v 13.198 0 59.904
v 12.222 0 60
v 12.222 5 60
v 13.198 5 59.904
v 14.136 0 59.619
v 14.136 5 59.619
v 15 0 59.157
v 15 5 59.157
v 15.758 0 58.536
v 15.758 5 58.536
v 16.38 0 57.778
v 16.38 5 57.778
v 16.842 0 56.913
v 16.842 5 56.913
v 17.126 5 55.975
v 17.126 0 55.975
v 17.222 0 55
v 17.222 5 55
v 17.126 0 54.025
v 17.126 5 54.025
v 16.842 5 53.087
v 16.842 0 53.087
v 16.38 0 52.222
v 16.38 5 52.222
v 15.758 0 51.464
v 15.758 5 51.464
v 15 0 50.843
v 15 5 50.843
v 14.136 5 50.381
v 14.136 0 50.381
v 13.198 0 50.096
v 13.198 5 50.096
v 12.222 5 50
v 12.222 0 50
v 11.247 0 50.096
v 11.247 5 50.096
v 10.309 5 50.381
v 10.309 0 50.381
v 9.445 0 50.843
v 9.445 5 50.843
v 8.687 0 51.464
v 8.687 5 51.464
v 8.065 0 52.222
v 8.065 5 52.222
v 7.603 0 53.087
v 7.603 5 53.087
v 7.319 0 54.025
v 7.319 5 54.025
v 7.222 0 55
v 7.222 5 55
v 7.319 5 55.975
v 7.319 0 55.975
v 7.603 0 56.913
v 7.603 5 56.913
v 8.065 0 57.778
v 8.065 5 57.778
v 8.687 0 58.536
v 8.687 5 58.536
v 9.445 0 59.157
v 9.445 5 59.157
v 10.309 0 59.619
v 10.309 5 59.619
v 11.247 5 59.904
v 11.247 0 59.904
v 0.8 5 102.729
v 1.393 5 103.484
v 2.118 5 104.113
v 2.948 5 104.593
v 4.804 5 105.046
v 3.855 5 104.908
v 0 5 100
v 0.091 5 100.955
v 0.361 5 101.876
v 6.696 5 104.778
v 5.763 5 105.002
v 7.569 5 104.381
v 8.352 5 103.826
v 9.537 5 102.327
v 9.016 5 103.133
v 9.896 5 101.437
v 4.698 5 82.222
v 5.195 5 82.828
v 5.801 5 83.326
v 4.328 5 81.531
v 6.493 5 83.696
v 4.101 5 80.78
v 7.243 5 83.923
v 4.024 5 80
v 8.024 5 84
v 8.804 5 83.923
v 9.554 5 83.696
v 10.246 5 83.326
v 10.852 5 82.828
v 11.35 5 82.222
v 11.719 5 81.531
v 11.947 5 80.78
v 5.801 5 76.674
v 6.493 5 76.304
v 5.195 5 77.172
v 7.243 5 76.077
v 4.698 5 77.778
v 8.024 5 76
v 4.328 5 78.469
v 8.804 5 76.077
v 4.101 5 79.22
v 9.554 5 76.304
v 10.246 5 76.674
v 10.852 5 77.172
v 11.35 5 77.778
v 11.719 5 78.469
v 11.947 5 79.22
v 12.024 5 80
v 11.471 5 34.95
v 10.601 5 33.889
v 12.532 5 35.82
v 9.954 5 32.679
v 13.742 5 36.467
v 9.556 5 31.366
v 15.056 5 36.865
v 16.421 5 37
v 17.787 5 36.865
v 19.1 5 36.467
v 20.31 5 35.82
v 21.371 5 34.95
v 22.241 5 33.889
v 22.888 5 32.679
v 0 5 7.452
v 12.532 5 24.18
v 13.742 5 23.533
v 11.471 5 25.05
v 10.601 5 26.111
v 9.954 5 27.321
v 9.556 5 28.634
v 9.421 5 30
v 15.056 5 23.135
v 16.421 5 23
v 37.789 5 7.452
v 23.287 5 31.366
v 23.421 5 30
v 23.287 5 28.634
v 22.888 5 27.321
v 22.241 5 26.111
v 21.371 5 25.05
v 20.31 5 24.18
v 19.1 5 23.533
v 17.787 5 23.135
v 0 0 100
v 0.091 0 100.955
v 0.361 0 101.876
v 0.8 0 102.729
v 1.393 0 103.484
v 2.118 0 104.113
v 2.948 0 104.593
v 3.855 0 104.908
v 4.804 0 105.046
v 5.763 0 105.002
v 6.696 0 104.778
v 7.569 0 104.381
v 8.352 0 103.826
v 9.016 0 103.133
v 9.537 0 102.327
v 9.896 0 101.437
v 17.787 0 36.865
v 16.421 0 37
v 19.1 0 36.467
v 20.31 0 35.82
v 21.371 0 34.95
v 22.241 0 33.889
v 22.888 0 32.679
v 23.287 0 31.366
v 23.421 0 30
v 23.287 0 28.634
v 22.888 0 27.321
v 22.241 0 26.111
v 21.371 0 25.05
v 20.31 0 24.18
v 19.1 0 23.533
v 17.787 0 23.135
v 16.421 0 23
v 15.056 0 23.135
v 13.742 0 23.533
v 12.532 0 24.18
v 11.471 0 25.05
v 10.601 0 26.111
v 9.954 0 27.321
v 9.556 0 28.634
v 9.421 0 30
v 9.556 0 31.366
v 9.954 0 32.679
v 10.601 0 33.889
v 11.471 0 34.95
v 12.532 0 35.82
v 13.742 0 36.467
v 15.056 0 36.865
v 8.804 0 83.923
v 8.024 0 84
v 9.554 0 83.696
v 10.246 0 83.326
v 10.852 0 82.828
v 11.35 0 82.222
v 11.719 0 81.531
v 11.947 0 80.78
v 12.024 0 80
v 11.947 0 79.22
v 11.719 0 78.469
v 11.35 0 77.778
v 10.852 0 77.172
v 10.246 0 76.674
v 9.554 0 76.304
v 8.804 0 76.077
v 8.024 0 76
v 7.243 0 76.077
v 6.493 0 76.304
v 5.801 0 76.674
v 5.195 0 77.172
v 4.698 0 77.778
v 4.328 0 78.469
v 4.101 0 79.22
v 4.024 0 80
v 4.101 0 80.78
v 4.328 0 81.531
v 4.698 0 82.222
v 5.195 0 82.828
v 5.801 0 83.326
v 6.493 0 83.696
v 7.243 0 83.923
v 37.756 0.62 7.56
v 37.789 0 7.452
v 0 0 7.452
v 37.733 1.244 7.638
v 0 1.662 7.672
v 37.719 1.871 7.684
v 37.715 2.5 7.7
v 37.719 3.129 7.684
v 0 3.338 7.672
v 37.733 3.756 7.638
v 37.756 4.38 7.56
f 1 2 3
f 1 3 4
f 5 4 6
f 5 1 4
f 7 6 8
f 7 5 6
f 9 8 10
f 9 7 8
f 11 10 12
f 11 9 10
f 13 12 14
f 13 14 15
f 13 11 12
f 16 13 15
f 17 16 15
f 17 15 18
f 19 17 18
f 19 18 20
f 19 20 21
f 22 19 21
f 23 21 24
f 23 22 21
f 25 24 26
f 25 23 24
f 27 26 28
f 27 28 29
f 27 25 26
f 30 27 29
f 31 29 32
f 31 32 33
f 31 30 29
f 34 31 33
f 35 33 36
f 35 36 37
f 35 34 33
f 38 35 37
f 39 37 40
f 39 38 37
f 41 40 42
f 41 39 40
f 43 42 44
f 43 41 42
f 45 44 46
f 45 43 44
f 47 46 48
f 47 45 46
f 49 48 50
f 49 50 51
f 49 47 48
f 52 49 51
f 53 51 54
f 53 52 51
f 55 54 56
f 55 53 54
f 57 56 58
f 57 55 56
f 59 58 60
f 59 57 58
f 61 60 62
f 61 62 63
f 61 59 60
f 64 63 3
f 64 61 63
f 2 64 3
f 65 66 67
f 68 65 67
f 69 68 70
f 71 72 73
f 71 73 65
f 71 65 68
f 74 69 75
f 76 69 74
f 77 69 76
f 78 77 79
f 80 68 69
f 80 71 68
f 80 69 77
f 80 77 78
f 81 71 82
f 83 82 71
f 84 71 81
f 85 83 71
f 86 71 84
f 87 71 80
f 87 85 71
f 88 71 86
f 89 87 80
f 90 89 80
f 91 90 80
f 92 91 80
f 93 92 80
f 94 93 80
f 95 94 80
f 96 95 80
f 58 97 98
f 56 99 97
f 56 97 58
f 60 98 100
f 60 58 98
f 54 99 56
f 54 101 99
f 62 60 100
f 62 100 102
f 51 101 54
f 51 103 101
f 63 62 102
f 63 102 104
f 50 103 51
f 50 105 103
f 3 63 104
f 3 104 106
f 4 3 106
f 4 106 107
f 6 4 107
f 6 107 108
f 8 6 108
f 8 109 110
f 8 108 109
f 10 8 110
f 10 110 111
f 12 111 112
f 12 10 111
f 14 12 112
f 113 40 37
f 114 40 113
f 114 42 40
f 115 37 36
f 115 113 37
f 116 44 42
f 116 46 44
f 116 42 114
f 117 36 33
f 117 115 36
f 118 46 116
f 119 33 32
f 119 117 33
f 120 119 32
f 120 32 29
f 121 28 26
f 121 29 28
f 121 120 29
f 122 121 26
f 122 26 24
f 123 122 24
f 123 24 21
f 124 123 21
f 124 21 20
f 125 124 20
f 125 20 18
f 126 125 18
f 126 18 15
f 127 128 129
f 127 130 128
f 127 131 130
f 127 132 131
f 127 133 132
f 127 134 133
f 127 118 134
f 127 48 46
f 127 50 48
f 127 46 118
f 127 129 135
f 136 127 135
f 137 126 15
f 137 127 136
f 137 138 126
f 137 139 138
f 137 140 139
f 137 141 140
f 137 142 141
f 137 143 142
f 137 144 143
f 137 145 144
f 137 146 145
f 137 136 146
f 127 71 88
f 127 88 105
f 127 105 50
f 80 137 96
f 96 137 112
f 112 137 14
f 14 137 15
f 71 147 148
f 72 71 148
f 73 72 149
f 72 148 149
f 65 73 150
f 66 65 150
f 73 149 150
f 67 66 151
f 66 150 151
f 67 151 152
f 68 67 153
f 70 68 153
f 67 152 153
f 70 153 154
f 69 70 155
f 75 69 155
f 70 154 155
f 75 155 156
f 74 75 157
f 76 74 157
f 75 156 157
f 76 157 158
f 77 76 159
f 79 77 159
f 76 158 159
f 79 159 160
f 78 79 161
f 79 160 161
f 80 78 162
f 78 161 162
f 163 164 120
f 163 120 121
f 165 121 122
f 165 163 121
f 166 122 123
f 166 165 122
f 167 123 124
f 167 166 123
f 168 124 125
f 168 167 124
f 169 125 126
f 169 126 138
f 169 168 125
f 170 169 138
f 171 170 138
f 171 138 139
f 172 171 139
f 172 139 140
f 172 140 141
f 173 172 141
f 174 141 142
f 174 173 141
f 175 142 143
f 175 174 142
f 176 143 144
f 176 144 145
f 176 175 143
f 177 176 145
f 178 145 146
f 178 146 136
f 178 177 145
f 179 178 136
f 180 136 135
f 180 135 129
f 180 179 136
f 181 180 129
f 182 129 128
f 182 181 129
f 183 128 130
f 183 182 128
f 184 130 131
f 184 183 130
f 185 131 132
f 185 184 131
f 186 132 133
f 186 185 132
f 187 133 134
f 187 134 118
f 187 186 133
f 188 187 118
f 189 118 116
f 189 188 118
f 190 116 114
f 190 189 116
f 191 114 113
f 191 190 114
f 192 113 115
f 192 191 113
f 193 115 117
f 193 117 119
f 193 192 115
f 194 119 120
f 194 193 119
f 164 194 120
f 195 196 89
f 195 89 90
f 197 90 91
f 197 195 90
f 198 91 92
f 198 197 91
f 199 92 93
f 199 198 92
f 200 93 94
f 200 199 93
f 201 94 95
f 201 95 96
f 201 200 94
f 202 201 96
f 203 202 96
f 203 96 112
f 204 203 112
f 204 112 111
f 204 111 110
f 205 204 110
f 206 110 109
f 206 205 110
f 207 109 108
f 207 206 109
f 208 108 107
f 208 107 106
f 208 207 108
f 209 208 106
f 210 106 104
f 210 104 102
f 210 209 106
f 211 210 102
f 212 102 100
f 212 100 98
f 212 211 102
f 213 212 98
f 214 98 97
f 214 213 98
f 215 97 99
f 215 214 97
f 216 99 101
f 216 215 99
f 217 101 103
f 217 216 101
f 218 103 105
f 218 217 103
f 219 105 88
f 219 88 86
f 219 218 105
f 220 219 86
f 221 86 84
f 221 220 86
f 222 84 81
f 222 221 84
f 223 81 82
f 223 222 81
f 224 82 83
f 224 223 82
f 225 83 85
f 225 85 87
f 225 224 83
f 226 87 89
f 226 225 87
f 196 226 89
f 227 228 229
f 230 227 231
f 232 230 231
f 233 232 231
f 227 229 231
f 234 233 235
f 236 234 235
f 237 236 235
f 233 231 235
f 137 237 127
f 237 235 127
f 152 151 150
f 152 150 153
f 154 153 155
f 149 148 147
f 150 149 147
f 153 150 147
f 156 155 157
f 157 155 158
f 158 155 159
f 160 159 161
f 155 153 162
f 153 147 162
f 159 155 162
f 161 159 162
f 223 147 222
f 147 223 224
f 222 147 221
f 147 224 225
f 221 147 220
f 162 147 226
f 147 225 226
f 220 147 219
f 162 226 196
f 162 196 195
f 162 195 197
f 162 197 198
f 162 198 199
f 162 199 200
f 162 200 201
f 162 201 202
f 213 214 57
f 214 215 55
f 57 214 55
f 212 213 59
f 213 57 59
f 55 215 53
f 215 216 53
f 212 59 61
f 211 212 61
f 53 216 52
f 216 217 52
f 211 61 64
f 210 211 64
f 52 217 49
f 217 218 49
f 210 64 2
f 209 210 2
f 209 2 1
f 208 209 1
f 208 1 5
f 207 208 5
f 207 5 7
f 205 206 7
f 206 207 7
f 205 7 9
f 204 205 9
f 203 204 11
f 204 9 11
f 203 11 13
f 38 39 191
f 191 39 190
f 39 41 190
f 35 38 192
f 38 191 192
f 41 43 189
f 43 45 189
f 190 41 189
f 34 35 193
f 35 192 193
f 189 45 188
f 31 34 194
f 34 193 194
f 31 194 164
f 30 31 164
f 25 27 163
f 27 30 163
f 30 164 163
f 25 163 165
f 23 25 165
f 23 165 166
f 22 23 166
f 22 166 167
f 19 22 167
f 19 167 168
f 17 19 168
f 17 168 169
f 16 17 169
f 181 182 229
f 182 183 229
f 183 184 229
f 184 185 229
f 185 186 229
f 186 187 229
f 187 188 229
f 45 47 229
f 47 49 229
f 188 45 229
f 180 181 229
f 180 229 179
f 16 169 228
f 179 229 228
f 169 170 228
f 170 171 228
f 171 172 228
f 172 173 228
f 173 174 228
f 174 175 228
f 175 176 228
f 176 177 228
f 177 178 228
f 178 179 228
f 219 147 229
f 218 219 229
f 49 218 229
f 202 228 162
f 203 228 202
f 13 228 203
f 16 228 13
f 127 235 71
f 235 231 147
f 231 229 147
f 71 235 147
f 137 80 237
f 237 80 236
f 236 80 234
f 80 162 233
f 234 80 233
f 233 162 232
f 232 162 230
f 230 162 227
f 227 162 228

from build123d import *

# Parameters (mm, degrees)
SKETCH1_R           = 4
SKETCH1_R_2         = 5
SKETCH1_R_3         = 7
BOSS_EXTRUDE1_DEPTH = 5
SKETCH2_R           = 12.7
CUT_EXTRUDE1_DEPTH  = 50


with BuildPart() as part:
    # Sketch1 → Boss-Extrude1 (new body)
    with BuildSketch(Plane(origin=(0, 0, 0), x_dir=(1, 0, 0), z_dir=(0, 1, 0))):
        with BuildLine():
            Line((0, 0), (0, -100))
            ThreePointArc((0, -100), (4.326195296, -105), (9.896144859, -101.437468934))
            Line((9.896144859, -101.437468934), (40, 0))
            Line((40, 0), (0, 0))
        make_face()
        with Locations(Location((8.0237285, -80, 0), (0, 0, 270))):
            Circle(SKETCH1_R, mode=Mode.SUBTRACT)
        with Locations(Location((12.222443443, -55, 0), (0, 0, 270))):
            Circle(SKETCH1_R_2, mode=Mode.SUBTRACT)
        with Locations(Location((16.421158385, -30, 0), (0, 0, 270))):
            Circle(SKETCH1_R_3, mode=Mode.SUBTRACT)
    extrude(amount=BOSS_EXTRUDE1_DEPTH)

    # Sketch2 → Cut-Extrude1 (cut)
    with BuildSketch(Plane.ZY):
        with Locations((-5, 2.5)):
            Circle(SKETCH2_R)
    extrude(amount=-CUT_EXTRUDE1_DEPTH, mode=Mode.SUBTRACT)


solid = part.part
